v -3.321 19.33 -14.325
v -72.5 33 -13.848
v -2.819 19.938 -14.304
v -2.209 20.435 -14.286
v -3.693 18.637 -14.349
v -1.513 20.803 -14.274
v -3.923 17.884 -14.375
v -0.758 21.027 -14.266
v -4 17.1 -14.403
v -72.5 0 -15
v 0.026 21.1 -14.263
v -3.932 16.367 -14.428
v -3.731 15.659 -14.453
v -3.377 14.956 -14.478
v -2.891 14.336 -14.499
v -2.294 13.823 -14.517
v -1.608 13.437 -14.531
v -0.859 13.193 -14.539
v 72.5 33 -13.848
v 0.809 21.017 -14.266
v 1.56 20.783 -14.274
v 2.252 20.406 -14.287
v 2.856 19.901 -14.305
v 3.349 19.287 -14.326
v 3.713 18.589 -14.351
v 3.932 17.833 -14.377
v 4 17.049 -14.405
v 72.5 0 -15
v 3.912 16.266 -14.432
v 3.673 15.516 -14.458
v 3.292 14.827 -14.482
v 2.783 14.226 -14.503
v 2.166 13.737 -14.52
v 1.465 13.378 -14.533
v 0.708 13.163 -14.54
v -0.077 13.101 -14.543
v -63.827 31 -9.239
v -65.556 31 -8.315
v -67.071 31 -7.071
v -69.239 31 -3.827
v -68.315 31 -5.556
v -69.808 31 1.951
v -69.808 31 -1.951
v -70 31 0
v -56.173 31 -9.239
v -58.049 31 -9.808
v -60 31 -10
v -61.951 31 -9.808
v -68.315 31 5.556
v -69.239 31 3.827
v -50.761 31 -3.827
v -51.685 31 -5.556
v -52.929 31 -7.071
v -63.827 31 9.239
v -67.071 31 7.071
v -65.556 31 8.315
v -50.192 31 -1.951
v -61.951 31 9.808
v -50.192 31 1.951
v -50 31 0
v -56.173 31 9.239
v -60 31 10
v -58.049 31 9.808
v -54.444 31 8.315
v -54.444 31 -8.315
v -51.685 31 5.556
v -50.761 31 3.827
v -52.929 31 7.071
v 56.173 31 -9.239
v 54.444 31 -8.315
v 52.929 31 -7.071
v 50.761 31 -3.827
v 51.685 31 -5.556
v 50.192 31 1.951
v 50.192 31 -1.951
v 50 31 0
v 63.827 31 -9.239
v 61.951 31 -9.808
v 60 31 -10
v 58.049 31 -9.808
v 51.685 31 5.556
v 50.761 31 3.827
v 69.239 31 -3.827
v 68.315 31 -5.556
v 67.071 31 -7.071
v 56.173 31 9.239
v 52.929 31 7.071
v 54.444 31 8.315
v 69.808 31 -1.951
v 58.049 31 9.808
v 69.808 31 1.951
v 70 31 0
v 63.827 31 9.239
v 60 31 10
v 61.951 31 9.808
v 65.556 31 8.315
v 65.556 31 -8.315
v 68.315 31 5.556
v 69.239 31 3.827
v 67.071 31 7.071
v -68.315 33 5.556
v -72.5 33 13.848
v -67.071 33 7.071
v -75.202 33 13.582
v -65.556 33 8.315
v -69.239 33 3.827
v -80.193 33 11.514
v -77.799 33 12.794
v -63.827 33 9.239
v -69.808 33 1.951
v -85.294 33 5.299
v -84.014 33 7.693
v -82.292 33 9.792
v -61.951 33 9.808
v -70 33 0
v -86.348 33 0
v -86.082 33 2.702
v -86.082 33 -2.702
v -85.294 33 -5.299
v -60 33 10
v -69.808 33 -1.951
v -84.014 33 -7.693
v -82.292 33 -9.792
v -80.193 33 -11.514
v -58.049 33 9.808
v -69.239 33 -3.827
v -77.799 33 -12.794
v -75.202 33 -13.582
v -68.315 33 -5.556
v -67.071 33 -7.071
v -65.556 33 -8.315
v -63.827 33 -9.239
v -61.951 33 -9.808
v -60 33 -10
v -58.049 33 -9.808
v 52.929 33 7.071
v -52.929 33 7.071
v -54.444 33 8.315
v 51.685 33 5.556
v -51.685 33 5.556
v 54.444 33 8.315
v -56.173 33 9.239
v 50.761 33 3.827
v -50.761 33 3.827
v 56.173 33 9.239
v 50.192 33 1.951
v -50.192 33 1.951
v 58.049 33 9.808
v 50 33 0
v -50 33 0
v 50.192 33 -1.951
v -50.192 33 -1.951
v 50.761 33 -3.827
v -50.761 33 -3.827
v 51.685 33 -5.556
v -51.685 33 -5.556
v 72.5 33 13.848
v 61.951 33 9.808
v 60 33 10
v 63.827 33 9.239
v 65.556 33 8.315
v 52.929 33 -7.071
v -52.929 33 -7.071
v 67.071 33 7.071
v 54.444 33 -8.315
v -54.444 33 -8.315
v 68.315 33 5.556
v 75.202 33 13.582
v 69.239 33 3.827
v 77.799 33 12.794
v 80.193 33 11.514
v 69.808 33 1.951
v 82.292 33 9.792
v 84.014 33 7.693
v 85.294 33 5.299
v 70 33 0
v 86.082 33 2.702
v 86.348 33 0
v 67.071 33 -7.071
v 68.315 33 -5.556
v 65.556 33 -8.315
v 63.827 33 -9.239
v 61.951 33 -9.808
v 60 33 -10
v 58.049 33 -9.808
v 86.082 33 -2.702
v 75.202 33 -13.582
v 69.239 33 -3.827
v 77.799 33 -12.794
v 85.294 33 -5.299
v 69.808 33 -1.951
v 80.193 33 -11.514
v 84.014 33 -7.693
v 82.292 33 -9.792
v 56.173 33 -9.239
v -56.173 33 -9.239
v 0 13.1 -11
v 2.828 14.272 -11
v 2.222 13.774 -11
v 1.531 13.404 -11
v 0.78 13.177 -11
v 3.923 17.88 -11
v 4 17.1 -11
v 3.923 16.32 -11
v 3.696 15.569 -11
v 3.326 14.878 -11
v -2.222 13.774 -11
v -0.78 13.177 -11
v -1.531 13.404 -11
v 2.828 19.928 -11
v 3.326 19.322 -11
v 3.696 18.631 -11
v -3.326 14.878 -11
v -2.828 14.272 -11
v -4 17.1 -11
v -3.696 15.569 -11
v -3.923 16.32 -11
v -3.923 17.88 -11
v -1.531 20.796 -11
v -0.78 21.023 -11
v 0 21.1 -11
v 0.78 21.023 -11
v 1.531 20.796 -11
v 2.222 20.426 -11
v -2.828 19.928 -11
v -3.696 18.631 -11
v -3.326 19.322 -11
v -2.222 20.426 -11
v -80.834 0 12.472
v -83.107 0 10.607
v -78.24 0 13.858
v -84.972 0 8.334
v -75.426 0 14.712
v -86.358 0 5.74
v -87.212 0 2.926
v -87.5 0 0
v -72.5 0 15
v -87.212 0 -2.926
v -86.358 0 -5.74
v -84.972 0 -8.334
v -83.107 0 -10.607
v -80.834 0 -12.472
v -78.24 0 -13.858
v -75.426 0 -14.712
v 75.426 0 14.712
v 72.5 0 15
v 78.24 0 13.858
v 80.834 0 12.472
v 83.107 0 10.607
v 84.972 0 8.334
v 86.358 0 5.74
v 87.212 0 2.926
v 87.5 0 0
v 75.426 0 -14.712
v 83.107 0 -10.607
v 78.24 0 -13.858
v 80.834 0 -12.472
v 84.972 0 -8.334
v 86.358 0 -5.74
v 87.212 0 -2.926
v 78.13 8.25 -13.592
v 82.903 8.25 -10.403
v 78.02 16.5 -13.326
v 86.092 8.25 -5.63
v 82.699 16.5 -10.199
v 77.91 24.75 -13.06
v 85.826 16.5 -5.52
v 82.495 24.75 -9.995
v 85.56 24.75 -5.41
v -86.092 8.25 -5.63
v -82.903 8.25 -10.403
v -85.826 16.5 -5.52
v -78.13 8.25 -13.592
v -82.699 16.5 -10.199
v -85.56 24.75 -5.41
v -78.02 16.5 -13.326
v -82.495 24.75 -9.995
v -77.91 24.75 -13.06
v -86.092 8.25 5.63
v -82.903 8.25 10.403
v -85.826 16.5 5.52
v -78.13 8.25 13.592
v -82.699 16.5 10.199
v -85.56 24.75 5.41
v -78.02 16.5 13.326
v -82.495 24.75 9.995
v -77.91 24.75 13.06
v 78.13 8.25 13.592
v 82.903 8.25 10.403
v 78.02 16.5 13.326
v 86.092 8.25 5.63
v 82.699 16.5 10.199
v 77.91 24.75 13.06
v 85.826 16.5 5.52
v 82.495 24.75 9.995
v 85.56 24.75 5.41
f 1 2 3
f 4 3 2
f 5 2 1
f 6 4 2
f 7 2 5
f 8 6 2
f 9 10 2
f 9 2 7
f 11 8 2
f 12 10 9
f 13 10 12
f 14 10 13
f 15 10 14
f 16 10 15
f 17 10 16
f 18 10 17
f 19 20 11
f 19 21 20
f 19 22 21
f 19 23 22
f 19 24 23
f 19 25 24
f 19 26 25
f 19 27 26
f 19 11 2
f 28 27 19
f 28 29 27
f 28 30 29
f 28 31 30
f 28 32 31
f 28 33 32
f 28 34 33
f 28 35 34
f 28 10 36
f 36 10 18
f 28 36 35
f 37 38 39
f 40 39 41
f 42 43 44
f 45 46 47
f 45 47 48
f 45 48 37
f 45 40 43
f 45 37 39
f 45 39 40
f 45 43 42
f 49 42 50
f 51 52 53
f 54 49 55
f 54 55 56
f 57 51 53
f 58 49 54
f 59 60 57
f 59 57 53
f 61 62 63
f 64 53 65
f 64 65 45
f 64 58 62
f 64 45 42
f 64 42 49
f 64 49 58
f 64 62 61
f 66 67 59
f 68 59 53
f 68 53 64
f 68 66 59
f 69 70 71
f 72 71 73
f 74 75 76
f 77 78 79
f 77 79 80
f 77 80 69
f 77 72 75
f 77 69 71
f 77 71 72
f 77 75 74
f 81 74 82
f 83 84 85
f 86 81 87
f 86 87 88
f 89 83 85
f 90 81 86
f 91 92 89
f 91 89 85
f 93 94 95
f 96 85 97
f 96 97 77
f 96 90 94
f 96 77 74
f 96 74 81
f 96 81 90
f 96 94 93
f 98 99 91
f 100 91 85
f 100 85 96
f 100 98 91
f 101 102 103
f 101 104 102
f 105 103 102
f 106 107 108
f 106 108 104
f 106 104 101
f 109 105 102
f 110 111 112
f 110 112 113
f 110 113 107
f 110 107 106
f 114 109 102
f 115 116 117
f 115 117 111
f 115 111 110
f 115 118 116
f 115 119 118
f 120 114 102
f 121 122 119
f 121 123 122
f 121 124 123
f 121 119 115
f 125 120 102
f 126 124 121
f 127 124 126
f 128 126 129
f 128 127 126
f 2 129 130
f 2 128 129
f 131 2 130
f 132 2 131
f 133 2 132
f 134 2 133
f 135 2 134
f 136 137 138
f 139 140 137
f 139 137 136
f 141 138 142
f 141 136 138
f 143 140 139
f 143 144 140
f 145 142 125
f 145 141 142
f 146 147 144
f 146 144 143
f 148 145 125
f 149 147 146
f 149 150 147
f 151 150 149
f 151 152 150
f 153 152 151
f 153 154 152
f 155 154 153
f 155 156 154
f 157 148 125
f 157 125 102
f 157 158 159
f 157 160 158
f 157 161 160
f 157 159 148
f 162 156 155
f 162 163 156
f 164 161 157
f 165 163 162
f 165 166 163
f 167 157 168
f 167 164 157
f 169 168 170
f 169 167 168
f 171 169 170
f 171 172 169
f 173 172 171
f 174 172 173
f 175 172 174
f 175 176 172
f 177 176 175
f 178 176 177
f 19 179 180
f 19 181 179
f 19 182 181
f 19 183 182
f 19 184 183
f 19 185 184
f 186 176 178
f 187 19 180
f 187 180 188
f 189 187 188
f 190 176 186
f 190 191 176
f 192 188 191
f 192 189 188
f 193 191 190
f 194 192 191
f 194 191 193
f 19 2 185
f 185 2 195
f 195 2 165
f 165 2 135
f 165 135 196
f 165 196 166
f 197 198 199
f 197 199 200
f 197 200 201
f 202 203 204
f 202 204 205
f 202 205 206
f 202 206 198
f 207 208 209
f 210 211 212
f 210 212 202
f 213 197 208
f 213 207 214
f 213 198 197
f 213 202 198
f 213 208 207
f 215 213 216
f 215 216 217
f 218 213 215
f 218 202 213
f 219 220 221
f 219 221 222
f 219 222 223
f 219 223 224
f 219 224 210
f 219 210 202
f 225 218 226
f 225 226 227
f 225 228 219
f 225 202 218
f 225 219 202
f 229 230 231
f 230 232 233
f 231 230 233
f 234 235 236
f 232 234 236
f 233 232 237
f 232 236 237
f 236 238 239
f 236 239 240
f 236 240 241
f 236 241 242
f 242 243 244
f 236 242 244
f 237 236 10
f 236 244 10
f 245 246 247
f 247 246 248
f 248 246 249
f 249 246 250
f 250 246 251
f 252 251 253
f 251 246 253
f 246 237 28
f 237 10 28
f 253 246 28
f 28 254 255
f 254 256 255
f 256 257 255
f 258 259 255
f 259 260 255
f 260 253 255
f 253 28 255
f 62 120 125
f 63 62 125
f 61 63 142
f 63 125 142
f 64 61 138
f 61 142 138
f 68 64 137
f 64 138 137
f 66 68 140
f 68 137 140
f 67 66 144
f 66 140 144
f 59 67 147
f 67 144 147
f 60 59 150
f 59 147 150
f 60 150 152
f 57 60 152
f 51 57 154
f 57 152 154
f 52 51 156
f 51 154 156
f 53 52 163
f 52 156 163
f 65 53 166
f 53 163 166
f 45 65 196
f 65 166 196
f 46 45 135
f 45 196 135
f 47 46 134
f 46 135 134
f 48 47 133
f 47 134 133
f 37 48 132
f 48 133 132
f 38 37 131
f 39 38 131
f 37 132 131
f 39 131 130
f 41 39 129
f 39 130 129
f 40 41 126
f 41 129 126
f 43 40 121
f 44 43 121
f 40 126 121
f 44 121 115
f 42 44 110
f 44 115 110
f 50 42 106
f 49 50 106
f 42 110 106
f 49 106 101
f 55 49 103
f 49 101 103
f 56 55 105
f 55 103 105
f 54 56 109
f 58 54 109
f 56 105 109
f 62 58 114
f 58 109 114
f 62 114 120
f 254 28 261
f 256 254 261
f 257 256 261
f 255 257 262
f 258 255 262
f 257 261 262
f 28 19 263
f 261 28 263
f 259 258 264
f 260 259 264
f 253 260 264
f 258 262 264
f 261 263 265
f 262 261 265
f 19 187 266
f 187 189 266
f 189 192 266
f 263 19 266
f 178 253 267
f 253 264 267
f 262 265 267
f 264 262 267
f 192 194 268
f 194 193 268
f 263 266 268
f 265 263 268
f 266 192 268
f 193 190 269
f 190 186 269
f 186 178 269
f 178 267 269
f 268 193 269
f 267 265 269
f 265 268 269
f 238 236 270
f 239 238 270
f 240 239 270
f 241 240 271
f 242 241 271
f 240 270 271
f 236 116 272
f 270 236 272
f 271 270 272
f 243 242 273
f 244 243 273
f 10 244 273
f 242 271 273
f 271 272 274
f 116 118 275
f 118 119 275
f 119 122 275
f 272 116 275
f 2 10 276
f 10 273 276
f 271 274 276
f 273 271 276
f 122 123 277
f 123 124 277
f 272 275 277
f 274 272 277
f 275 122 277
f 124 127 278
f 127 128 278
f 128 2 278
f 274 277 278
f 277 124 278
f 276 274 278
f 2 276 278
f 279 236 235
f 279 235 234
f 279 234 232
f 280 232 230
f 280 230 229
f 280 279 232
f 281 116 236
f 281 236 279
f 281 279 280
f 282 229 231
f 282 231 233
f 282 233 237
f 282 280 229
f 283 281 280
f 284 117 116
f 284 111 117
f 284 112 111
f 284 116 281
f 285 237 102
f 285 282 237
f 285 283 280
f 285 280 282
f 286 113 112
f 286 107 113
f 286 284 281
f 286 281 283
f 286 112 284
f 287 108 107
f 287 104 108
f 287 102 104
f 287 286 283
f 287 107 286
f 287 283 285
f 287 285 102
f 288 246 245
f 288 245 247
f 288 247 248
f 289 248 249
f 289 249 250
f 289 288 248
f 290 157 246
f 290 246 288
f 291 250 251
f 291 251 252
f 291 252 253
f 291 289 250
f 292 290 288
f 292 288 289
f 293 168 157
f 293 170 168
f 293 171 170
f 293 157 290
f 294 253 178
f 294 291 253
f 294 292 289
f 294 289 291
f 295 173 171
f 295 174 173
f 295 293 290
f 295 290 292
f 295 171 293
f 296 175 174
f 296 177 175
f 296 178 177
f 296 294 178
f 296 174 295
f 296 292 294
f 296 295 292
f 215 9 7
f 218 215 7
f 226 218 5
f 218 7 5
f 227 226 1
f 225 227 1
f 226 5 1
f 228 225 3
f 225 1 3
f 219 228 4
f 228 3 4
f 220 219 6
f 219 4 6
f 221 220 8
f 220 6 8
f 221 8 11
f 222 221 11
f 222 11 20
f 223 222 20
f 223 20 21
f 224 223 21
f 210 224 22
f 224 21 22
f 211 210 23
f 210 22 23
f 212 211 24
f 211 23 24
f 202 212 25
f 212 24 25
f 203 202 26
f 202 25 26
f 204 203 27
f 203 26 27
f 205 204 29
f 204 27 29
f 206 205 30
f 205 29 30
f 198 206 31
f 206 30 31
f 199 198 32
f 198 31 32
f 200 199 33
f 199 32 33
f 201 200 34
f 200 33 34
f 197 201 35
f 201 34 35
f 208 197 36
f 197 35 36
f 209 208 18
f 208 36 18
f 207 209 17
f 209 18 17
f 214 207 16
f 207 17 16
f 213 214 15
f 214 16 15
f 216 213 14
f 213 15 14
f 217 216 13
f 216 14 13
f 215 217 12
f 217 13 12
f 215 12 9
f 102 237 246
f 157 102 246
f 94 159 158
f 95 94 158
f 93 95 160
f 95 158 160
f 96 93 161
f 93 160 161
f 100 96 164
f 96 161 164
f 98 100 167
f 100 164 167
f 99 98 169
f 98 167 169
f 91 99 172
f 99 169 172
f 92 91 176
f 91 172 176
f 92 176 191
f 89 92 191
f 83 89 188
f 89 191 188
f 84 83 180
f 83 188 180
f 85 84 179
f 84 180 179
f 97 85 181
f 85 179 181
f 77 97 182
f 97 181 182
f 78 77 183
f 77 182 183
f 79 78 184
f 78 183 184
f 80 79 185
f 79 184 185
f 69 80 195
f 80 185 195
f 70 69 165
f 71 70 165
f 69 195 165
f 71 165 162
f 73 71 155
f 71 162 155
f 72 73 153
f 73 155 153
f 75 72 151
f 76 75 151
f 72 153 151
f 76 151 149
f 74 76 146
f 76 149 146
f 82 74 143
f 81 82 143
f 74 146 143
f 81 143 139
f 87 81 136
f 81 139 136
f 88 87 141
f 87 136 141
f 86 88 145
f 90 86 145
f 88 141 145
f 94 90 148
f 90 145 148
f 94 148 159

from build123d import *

# Parameters (mm, degrees)
SKETCH1_W           = 175
SKETCH1_H           = 30
BOSS_EXTRUDE1_DEPTH = 33
SKETCH3_R           = 10
CUT_EXTRUDE1_DEPTH  = 2
FILLET1_R           = 15
SKETCH4_R           = 4
CUT_EXTRUDE2_DEPTH  = 4
DRAFT3_ANGLE        = -2


with BuildPart() as part:
    # Sketch1 → Boss-Extrude1 (new body)
    with BuildSketch(Plane(origin=(0, 0, 0), x_dir=(1, 0, 0), z_dir=(0, 1, 0))):
        Rectangle(SKETCH1_W, SKETCH1_H)
    extrude(amount=BOSS_EXTRUDE1_DEPTH)

    # Sketch3 → Cut-Extrude1 (cut)
    with BuildSketch(Plane(origin=(0, 33, 0), x_dir=(1, 0, 0), z_dir=(0, 1, 0))):
        with Locations(Location((-60, 0, 0), (0, 0, 270))):
            Circle(SKETCH3_R)
        with Locations(Location((60, 0, 0), (0, 0, 270))):
            Circle(SKETCH3_R)
    extrude(amount=-CUT_EXTRUDE1_DEPTH, mode=Mode.SUBTRACT)

    # Fillet1
    fillet1_edges = [part.edges().sort_by_distance(p)[0] for p in [
        (-87.5, 16.5, -15),
        (87.5, 16.5, 15),
        (87.5, 16.5, -15),
        (-87.5, 16.5, 15),
    ]]
    fillet(fillet1_edges, radius=FILLET1_R - 0.0001)  # a hair under: the kernel refuses the full size

    # Sketch4 → Cut-Extrude2 (cut)
    with BuildSketch(Plane(origin=(0, 0, -15), x_dir=(-1, 0, 0), z_dir=(0, 0, -1))):
        with Locations((0, 17.1)):
            Circle(SKETCH4_R)
    extrude(amount=-CUT_EXTRUDE2_DEPTH, mode=Mode.SUBTRACT)

    # Draft3
    draft3_faces = [part.faces().sort_by_distance(p)[0] for p in [
        (0, 16.5, 15),
        (83.106631007, 16.5, 10.606631007),
        (83.106631007, 16.5, -10.606631007),
        (0, 1.487079621, -15),
        (-83.106631007, 16.5, 10.606631007),
        (-83.106631007, 16.5, -10.606631007),
    ]]
    draft(draft3_faces, Plane(origin=(0, 0, 0), x_dir=(0, 0, -1), z_dir=(0, -1, 0)), DRAFT3_ANGLE)


solid = part.part
